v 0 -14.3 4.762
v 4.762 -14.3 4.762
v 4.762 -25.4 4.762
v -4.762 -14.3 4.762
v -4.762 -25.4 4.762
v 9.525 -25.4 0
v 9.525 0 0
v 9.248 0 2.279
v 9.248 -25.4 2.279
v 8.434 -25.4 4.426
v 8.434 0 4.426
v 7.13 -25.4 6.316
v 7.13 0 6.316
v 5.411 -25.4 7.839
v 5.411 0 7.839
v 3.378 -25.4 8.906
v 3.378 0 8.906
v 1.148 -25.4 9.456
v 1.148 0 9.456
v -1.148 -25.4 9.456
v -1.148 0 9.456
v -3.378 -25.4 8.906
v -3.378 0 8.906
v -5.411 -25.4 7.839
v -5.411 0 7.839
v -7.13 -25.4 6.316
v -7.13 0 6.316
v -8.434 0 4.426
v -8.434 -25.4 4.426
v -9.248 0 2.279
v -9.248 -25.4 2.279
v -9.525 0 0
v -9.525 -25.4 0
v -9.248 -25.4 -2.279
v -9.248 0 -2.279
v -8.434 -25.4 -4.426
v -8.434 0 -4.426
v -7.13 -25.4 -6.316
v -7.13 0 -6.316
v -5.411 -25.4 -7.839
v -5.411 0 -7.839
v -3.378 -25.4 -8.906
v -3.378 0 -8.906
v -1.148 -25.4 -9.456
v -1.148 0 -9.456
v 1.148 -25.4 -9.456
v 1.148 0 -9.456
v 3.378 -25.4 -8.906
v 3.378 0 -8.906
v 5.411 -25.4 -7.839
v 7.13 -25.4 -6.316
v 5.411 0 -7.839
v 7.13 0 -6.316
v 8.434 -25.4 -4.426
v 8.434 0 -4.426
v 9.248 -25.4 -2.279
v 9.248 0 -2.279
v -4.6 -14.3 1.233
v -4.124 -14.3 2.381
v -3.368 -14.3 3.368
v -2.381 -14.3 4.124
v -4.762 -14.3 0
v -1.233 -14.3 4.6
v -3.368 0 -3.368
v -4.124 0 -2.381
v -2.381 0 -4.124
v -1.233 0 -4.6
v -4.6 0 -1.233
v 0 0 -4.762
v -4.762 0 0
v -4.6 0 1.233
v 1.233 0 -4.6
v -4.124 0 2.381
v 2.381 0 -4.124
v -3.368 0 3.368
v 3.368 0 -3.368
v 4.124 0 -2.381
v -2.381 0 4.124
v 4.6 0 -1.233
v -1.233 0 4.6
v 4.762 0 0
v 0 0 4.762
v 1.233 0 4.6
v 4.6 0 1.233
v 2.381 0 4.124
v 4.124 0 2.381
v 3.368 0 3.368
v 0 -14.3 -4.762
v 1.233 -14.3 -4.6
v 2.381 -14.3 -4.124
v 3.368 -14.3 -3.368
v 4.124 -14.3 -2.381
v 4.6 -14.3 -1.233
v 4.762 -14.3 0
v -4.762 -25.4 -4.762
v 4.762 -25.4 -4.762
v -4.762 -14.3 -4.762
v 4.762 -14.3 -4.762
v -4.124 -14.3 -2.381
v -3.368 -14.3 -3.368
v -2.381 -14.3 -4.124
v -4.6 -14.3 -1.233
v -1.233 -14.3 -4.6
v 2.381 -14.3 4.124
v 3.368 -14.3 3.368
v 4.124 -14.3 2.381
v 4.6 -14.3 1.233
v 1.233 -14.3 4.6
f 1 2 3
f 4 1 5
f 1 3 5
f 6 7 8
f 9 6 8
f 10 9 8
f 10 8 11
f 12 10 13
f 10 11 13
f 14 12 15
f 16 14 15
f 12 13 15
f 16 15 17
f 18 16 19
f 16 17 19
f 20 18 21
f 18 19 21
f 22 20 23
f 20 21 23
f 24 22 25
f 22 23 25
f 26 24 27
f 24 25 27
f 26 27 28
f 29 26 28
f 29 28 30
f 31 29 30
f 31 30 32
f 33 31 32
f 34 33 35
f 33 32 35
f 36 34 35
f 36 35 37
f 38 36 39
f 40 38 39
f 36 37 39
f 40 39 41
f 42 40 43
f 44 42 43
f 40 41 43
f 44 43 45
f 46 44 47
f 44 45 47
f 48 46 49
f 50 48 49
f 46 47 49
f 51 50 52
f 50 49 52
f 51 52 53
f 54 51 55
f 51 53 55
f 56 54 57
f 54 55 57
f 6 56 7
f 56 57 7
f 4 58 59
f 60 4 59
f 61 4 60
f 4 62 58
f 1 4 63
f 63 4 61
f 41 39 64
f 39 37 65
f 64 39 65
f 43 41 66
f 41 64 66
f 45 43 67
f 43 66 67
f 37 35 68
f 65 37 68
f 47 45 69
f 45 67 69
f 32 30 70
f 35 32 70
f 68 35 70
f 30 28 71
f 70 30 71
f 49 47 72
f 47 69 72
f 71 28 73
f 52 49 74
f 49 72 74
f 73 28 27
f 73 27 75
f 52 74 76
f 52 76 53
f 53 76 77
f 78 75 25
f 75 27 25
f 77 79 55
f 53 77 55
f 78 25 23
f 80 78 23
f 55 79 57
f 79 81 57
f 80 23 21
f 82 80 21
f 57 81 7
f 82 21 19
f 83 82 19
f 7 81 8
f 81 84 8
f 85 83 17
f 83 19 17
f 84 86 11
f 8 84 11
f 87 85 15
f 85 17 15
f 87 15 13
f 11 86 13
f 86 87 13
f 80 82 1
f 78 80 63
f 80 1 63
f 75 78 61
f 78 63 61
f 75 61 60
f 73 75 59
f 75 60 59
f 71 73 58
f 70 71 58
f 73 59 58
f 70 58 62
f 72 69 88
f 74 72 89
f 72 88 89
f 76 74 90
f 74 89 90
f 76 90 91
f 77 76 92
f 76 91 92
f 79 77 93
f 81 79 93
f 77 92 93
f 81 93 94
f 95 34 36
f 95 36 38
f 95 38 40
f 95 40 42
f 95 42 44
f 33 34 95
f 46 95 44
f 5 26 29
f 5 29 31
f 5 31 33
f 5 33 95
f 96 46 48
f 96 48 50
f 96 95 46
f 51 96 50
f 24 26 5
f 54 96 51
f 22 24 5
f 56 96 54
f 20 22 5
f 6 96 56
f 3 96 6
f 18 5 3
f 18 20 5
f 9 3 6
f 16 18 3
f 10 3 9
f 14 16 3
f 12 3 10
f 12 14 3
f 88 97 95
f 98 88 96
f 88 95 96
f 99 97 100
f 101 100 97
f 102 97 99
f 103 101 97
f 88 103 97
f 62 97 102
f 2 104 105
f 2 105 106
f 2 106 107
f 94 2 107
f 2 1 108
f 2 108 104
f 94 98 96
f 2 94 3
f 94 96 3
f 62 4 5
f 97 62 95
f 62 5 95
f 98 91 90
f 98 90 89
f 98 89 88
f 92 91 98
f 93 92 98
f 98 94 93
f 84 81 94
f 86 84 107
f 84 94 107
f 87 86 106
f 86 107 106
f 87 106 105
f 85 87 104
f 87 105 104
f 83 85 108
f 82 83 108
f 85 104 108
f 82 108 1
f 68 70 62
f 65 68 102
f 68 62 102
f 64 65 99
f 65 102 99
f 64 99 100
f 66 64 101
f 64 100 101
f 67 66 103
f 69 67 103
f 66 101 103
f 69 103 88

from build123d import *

# Parameters (mm, degrees)
F0_R     = 9.525
F1_DEPTH = 25.4
F3_DEPTH = 25.401
F4_DEPTH = 11.0998


with BuildPart() as f1:
    # F0 (on Front) → F1 (new body)
    with BuildSketch(Plane.XZ):
        Circle(F0_R)
    extrude(amount=F1_DEPTH)

    # F2 (on face) → F3 (cut, through all)
    with BuildSketch(Plane.XZ.offset(25.4)):
        with BuildLine():
            ThreePointArc((-4.7625, 0), (-3.367596, -3.367596), (0, -4.7625))
            ThreePointArc((0, -4.7625), (3.367596, -3.367596), (4.7625, 0))
            ThreePointArc((4.7625, 0), (3.367596, 3.367596), (0, 4.7625))
            ThreePointArc((0, 4.7625), (-3.367596, 3.367596), (-4.7625, 0))
        make_face()
    extrude(amount=-F3_DEPTH, mode=Mode.SUBTRACT)

    # F2 (on face) → F4 (cut)
    with BuildSketch(Plane.XZ.offset(25.4)):
        with BuildLine():
            Line((0, -4.7625), (4.7625, -4.7625))
            Line((4.7625, -4.7625), (4.7625, 0))
            ThreePointArc((4.7625, 0), (3.367596, -3.367596), (0, -4.7625))
        make_face()
        with BuildLine():
            Line((-4.7625, -4.7625), (0, -4.7625))
            ThreePointArc((0, -4.7625), (-3.367596, -3.367596), (-4.7625, 0))
            Line((-4.7625, 0), (-4.7625, -4.7625))
        make_face()
        with BuildLine():
            ThreePointArc((0, 4.7625), (3.367596, 3.367596), (4.7625, 0))
            Line((4.7625, 0), (4.7625, 4.7625))
            Line((4.7625, 4.7625), (0, 4.7625))
        make_face()
        with BuildLine():
            Line((-4.7625, 4.7625), (-4.7625, 0))
            ThreePointArc((-4.7625, 0), (-3.367596, 3.367596), (0, 4.7625))
            Line((0, 4.7625), (-4.7625, 4.7625))
        make_face()
    extrude(amount=-F4_DEPTH, mode=Mode.SUBTRACT)


solid = f1.part
